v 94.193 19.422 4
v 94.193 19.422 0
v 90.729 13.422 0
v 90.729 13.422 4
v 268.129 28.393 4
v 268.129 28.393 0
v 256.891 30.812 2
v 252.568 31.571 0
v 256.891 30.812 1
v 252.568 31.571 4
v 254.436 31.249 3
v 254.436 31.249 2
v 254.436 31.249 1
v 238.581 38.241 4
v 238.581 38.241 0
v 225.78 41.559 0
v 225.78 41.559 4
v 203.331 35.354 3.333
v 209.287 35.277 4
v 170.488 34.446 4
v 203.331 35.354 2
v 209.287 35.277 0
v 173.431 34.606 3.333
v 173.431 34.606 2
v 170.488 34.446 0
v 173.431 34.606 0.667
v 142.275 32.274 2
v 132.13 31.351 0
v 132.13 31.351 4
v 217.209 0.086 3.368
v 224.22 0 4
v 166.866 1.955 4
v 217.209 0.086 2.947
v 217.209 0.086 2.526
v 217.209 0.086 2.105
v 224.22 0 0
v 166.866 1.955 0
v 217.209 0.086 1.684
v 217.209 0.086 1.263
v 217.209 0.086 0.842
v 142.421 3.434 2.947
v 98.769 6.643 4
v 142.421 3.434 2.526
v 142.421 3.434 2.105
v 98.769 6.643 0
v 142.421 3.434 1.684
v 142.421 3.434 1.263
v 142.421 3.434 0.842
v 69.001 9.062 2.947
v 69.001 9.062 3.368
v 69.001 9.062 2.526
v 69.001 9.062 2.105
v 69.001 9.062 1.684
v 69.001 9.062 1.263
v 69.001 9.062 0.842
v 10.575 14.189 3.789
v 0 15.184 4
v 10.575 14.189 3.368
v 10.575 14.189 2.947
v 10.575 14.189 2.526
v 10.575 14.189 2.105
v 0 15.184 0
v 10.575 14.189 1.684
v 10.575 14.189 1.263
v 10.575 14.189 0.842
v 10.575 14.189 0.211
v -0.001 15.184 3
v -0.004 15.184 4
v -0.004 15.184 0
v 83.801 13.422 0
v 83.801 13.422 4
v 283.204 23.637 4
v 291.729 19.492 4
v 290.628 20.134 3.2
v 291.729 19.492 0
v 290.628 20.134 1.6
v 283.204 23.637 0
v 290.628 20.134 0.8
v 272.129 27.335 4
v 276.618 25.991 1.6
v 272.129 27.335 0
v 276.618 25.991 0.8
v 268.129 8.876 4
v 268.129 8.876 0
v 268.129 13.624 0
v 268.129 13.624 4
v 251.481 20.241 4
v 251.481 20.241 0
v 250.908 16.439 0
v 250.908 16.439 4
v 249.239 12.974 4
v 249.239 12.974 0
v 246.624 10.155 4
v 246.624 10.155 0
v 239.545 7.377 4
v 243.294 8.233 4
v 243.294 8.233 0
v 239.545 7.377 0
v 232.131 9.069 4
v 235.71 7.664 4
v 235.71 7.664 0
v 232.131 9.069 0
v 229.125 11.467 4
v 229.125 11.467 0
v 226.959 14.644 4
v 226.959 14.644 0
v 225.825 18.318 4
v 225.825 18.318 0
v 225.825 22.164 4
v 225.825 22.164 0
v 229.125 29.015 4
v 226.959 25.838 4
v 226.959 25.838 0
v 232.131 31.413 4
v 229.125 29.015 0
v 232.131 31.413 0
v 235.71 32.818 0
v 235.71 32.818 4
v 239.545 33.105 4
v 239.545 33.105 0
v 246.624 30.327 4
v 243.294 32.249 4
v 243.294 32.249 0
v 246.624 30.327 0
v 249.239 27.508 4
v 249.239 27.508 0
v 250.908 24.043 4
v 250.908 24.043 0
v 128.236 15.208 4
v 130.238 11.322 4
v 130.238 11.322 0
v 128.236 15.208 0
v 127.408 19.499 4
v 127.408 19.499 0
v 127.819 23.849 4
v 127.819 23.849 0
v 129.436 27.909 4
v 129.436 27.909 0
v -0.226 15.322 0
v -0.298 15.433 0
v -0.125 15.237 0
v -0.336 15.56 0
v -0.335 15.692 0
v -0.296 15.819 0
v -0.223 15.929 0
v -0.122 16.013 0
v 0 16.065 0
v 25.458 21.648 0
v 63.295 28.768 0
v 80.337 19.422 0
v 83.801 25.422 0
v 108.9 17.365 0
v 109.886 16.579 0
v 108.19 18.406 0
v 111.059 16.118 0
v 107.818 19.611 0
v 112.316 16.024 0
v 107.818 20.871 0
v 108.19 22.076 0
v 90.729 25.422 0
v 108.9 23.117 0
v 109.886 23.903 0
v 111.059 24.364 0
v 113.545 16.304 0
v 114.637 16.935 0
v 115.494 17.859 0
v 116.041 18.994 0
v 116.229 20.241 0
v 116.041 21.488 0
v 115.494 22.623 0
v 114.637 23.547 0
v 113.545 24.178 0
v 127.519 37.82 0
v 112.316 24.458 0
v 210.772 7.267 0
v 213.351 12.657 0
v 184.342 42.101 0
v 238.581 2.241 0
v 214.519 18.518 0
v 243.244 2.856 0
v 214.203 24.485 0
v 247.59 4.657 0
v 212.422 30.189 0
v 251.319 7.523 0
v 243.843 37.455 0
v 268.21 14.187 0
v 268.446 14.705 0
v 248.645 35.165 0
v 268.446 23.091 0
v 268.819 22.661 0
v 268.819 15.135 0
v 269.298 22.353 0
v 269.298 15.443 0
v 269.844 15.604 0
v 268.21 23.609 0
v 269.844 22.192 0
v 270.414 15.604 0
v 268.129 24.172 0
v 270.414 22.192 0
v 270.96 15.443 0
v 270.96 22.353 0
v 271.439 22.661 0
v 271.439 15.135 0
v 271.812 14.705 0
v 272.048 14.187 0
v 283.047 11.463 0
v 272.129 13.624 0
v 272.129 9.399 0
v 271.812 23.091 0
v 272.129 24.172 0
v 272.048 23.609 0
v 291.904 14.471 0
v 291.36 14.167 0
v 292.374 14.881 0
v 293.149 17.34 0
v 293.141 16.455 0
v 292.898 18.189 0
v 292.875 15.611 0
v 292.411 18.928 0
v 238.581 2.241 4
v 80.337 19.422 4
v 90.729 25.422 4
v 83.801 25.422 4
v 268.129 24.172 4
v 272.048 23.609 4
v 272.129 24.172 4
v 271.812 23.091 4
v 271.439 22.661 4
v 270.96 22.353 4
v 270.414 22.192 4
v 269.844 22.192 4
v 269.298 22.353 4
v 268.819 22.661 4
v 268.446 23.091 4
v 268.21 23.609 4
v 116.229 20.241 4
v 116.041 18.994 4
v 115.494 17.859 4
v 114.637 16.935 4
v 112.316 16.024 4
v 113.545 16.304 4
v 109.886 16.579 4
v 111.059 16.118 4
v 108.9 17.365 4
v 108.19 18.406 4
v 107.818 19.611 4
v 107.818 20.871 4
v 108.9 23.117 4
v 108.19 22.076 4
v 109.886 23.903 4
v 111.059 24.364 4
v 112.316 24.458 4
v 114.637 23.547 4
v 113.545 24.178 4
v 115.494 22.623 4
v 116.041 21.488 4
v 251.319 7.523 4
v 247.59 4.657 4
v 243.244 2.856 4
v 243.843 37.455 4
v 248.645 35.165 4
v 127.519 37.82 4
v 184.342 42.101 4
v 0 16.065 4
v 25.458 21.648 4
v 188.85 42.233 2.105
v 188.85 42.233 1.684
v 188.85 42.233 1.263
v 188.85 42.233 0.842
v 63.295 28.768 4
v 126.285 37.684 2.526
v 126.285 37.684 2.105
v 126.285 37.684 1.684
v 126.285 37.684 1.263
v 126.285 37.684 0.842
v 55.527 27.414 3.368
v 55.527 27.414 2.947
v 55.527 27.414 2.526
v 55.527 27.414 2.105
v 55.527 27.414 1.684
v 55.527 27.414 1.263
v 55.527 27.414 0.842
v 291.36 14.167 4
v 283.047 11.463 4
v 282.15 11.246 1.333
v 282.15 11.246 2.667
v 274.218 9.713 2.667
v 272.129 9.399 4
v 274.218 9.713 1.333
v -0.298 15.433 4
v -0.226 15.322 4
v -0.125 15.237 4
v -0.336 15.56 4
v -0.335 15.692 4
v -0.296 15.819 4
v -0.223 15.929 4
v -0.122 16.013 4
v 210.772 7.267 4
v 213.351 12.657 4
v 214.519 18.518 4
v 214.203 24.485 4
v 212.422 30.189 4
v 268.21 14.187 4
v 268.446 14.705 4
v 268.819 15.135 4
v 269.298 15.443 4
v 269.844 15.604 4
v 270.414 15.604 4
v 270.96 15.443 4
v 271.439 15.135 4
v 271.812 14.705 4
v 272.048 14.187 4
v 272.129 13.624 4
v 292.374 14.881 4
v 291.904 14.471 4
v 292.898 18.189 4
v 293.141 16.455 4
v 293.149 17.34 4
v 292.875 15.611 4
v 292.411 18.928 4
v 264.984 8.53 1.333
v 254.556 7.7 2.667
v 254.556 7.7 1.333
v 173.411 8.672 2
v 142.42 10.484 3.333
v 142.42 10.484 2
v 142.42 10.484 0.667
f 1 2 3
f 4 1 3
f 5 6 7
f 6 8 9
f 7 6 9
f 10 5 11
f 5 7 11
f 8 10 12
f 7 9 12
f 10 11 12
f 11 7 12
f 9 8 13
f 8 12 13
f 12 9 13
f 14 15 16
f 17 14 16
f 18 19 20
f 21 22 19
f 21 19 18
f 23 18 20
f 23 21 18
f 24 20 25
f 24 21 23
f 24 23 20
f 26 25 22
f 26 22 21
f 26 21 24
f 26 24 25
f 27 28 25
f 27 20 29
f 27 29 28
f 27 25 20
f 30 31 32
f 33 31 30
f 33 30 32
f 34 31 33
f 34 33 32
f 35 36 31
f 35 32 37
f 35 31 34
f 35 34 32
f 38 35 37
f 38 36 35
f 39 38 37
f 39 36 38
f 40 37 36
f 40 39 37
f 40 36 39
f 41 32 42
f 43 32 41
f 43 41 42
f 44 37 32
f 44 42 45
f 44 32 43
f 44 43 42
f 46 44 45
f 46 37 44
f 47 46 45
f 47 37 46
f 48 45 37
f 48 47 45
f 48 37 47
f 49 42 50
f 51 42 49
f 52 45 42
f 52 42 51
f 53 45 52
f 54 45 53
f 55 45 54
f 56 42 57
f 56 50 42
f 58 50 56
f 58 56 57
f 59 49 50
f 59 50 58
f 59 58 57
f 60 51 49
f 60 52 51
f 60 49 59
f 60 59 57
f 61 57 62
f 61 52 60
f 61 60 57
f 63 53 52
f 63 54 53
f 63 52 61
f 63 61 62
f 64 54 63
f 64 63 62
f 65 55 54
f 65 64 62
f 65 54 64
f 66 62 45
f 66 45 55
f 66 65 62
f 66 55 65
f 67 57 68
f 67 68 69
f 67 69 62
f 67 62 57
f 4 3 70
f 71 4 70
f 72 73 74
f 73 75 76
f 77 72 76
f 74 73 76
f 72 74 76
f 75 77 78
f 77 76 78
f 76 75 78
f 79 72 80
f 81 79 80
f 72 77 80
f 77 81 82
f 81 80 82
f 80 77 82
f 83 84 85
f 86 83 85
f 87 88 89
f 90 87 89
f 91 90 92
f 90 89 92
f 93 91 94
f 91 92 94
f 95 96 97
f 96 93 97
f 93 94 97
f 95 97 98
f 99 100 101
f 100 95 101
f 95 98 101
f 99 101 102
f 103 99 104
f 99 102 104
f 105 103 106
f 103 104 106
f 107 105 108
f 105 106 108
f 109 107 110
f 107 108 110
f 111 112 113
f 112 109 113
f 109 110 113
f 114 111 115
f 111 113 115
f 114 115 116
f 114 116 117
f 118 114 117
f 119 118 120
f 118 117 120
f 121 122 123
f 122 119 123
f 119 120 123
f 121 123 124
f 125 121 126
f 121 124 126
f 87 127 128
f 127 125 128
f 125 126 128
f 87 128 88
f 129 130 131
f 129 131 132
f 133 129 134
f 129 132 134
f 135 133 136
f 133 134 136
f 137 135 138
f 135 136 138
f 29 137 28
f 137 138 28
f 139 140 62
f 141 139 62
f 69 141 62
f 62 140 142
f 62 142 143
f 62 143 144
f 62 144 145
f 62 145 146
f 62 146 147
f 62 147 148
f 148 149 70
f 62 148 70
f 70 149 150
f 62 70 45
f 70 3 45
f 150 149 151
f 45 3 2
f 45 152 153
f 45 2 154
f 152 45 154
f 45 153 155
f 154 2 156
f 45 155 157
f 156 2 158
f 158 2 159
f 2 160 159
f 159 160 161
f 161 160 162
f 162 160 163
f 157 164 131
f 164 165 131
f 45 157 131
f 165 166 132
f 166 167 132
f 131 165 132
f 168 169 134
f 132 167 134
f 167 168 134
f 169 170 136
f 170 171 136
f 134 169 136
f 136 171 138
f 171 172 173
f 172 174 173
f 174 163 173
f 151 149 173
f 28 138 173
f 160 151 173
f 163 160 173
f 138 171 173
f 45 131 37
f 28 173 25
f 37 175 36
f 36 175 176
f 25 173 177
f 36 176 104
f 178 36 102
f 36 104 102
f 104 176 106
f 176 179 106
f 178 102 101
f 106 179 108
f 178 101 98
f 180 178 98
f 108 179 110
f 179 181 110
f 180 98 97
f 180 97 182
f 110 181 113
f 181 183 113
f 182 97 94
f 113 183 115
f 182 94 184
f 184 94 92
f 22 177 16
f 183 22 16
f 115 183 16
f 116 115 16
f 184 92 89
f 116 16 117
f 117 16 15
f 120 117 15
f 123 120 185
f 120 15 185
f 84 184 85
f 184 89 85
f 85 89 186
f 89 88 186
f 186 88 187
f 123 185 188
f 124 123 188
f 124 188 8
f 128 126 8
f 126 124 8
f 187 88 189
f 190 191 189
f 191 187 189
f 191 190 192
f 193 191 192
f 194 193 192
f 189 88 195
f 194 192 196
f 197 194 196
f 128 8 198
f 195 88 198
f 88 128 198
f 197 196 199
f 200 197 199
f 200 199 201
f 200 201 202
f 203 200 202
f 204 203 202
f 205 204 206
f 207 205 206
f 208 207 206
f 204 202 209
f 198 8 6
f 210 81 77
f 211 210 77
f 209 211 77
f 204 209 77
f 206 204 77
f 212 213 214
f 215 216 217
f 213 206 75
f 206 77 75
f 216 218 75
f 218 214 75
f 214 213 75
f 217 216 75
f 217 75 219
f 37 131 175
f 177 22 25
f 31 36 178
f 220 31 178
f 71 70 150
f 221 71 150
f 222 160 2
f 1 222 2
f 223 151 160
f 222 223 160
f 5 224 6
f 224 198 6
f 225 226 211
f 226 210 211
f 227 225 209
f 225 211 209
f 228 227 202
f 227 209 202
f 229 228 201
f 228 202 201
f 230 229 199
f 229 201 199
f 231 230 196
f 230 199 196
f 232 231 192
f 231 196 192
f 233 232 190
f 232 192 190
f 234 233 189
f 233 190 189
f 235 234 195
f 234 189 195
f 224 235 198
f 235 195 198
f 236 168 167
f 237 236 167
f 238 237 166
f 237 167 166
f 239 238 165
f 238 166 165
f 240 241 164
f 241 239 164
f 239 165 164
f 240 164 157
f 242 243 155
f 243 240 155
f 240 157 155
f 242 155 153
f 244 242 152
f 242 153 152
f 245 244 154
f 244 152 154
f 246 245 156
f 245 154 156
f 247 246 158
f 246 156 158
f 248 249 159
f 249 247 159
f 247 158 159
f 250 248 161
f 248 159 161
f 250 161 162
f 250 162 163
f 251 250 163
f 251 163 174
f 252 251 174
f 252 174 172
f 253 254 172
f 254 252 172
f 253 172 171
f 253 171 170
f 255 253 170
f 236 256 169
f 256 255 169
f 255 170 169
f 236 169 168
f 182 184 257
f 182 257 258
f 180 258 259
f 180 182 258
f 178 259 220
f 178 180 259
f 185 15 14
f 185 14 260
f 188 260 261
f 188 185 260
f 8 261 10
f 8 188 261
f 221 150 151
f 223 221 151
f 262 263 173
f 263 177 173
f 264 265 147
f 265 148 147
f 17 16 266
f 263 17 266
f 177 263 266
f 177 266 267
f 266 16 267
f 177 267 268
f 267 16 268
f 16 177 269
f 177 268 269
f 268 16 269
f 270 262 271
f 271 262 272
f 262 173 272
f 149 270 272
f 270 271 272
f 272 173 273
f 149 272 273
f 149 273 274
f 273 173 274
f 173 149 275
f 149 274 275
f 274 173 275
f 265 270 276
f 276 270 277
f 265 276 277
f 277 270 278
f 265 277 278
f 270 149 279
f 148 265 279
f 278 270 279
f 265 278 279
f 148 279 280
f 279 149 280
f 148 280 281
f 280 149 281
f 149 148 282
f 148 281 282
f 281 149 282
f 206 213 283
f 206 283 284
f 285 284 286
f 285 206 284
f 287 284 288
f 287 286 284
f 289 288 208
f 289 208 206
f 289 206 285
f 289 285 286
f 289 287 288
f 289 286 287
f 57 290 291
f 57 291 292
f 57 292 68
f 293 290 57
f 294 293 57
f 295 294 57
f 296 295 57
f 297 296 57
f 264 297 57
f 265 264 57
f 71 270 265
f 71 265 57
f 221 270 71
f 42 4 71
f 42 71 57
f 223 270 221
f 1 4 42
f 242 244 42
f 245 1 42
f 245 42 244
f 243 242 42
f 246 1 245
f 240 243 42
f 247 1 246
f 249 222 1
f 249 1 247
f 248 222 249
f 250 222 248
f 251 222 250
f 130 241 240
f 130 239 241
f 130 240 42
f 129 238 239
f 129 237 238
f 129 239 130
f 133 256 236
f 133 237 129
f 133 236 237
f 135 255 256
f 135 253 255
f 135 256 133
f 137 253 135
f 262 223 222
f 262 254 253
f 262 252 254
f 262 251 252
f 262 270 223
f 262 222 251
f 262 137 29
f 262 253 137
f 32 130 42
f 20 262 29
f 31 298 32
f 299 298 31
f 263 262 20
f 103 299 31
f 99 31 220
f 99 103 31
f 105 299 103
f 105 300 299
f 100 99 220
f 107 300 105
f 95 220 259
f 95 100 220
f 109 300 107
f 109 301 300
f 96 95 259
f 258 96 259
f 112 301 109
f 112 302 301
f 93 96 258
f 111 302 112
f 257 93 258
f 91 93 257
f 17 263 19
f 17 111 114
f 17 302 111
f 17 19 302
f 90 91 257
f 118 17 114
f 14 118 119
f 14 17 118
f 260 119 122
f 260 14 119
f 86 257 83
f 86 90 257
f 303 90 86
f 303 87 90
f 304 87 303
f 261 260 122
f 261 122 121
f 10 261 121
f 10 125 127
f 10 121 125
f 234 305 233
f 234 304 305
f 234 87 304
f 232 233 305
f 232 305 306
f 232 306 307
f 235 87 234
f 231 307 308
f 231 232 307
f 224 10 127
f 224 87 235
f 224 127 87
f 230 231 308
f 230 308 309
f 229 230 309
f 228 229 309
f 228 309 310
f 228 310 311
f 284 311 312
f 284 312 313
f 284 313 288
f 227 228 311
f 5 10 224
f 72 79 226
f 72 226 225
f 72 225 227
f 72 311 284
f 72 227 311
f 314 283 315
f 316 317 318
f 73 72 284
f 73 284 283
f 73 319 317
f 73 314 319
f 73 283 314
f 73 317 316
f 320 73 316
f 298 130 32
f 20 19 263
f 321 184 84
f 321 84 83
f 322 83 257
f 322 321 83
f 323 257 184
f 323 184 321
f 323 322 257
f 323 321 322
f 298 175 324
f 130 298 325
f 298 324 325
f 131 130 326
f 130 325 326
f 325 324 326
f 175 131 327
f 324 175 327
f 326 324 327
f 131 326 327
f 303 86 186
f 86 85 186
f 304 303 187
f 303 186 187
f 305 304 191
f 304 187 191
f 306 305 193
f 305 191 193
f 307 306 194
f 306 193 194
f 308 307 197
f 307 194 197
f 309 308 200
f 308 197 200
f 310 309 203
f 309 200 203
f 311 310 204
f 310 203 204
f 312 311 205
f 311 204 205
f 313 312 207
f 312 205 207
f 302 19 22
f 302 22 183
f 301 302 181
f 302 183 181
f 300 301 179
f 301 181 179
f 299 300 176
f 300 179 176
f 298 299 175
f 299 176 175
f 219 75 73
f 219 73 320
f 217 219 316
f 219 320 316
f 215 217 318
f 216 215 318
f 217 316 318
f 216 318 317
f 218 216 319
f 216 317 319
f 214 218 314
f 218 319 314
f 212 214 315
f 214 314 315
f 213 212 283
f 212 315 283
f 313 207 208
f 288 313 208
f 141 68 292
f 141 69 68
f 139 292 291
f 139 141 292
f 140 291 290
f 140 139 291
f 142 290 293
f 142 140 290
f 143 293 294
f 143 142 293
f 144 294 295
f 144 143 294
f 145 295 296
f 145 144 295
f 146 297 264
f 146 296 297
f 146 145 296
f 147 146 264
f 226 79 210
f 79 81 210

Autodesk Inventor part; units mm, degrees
ref_plane "YZ Plane" through (0, 0, 0) normal (1, 0, 0) x (0, 1, 0)
ref_plane "XZ Plane" through (0, 0, 0) normal (0, 1, 0) x (-1, 0, 0)
ref_plane "XY Plane" through (0, 0, 0) normal (0, 0, 1) x (1, 0, 0)
sketch "Sketch1" plane through (0, 0, 0) normal (0, 0, 1) x (1, 0, 0)
  spline S0 degree 4 poles (254.436054, 38.258138) (252.159915, 38.650332) (246.788709, 39.499265) (237.984874, 40.618279) (225.357478, 41.704285) (211.202741, 42.341661) (196.392584, 42.47009) (181.031283, 42.070233) (165.506388, 41.221743) (149.785249, 40.04478) (134.1096, 38.577548) (118.624688, 36.850842) (103.500036, 34.939301) (88.901638, 32.883406) (74.995754, 30.738214) (61.917783, 28.562704) (49.827113, 26.40977) (38.835364, 24.340018) (29.07721, 22.403865) (20.632296, 20.65644) (13.645605, 19.149082) (6.913163, 17.660714) (2.90218, 16.740022) (0.469137, 16.188187) (0, 16.065) knots 0.21429705 0.21429705 0.21429705 0.21429705 0.21429705 0.2433201 0.28177524 0.32154178 0.36237973 0.40400459 0.44617789 0.48866482 0.5312306 0.57368816 0.61580317 0.65733642 0.6980466 0.73768213 0.77598623 0.81268845 0.84749504 0.88008735 0.91009265 0.93705903 0.9603631 1 1 1 1 1
  spline S1 degree 4 poles (299.999997, 15.624) (299.805651, 13.312974) (297.70854, 10.343184) (293.050897, 7.5008) (285.395888, 4.883043) (278.112378, 3.216454) (269.51472, 1.892454) (259.681019, 0.912997) (248.712883, 0.278332) (236.711867, -0.030891) (223.806667, -0.050368) (210.125319, 0.193333) (195.775416, 0.645033) (180.96771, 1.249367) (165.65166, 1.982539) (150.191633, 2.90484) (134.687258, 3.945111) (119.337536, 5.049498) (104.304232, 6.19869) (89.75661, 7.356132) (75.849241, 8.488651) (62.742943, 9.582403) (50.581067, 10.622604) (39.497088, 11.57965) (29.629376, 12.451281) (21.071247, 13.226368) (13.963939, 13.872105) (7.103576, 14.512622) (2.968279, 14.899676) (0.533018, 15.1397) (-0.004161, 15.184114) knots 0 0 0 0 0 0.05437224 0.07982113 0.10791215 0.1384988 0.1713415 0.20618709 0.24278377 0.28089063 0.3202767 0.36071301 0.4020228 0.44398485 0.4863729 0.52895769 0.5714601 0.61364209 0.65526508 0.6960853 0.73585299 0.77430798 0.81117416 0.84615676 0.87892978 0.90911464 0.93625212 0.9597112 1 1 1 1 1
  arc A0 (0, 16.065) -> (-0.004161, 15.184114) centre (0.115799, 15.624) ccw
  line L0 (0.115799, 15.624) -> (227.990221, 15.624) construction
  line L1 (299.999997, 15.624) -> (0.115799, 15.624) construction
  line L2 (299.999997, 15.624) -> (199.999997, 15.624) construction
  line L3 (199.999997, 15.624) -> (199.999997, 42.37734) construction
  line L4 (199.999997, 15.624) -> (199.999997, 0.52729)
  line L5 (0, 0) -> (0, 20.241)
  line L6 (0, 20.241) -> (238.581, 20.241) construction
  circle A1 centre (238.581, 20.241) radius 14
  line L7 (238.581, 20.241) -> (208.581, 20.241)
  line L8 (238.581, 25.359) -> (238.581, 20.241)
  line L9 (0, 20.241) -> (112, 20.241) construction
  circle A2 centre (112, 20.241) radius 5.39
  line L10 (0, 15.624) -> (112, 15.624) construction
  line L11 (0, 15.624) -> (112, 15.624) construction
  line L12 (112, 15.624) -> (112, 35.994456)
  line L13 (112, 15.624) -> (112, 5.61525)
  spline S2 degree 4 poles (299.285198, 20.241) (299.227939, 20.131643) (299.16804, 20.023225) (299.105573, 19.915754) (299.040612, 19.809235) knots 0 0 0 0 0 1 1 1 1 1
  line L14 (299.207055, 20.082158) -> (298.87417, 19.536312) construction
  arc A3 (298.903999, 19.593162) -> (299.170168, 20.029611) centre (292.291091, 23.925437) ccw construction
  line L15 (299.43203, 20.521431) -> (299.138367, 19.960569) construction
  arc A4 (299.163926, 20.01882) -> (299.398715, 20.467241) centre (292.801001, 23.636075) ccw construction
  spline S3 degree 2 poles (295.850621, 16.559978) (295.157262, 16.069203) (294.393311, 15.624) knots 0 0 0 1 1 1
  line L16 (294.550692, 15.715716) -> (294.235931, 15.532284) construction
  arc A5 (294.267154, 15.551069) -> (294.518956, 15.69781) centre (283.884356, 33.65696) ccw construction
  spline S4 degree 4 poles (296.856901, 15.624) (296.618326, 15.862944) (296.370731, 16.098547) (296.114674, 16.330852) (295.850621, 16.559978) knots 0 0 0 0 0 1 1 1 1 1
  spline S5 degree 4 poles (219.58717, 34.91187) (218.695351, 34.95198) (214.858509, 35.106335) (210.707211, 35.329502) (192.898023, 35.446366) (181.42777, 35.055508) (165.177387, 34.181901) (149.561876, 33.12667) (133.828431, 31.347909) (128.265438, 31.097419) (123.390775, 30.590026) knots 0 0 0 0 0 0.13924435 0.23321956 0.36393672 0.50998276 0.65711487 0.7981047 1 1 1 1 1
  line L17 (295.959293, 16.465681) -> (295.74195, 16.654276) construction
  arc A6 (295.937354, 16.484307) -> (295.763482, 16.635181) centre (281.87292, 0.451609) ccw construction
  line L18 (232.743774, 34.364452) -> (201.193566, 35.681454) construction
  arc A7 (229.586762, 34.454933) -> (204.347135, 35.508511) centre (136.348344, -1896.324468) ccw construction
  arc A8 (264.266057, 15.123) -> (264.360826, 15.624) centre (238.581, 20.241) ccw
  circle A9 centre (238.581, 20.241) radius 24
  circle A10 centre (112, 20.241) radius 15.39
  spline S6 degree 4 poles (299.999997, 15.624) (300.269142, 17.933652) (298.783415, 21.267693) (294.693448, 24.979847) (287.53174, 28.940551) (280.486947, 31.820538) (271.480983, 34.718213) (262.486804, 36.793013) (257.700386, 37.695672) (254.436054, 38.258138) knots 0 0 0 0 0 0.24755477 0.36385739 0.4925498 0.63299607 0.77826439 1 1 1 1 1
  line L19 (285.294543, 32.941011) -> (223.577565, 43.575266) construction
  arc A11 (278.722442, 32.634865) -> (229.668212, 41.087243) centre (217.218351, -177.738587) ccw construction
  line L20 (285.294543, 32.941011) -> (223.577565, 43.575266) construction
  arc A12 (278.877125, 33.041766) -> (229.658629, 41.522447) centre (200.894913, -272.473315) ccw construction
  spline S7 degree 4 poles (251.493, 31.73616) (243.700929, 32.967588) (232.160237, 34.296592) (216.442824, 35.287928) (196.392341, 35.461091) (181.031705, 35.061513) (165.505292, 34.212684) (149.788285, 33.036509) (134.101234, 31.567156) (118.647366, 29.846206) (103.439709, 27.919279) (89.058912, 25.903716) (74.837064, 23.692714) (62.488433, 21.669546) (49.639937, 19.354465) (46.379459, 18.742869) (43.812536, 18.259032) knots 0 0 0 0 0 0.1639631 0.23233838 0.3020312 0.37264227 0.44377843 0.51504665 0.58613365 0.65664712 0.72618654 0.7943479 0.86070997 0.92034602 1 1 1 1 1 construction
  spline S8 degree 4 poles (295.845009, 16.556007) (295.719822, 16.664559) (294.584958, 17.628339) (292.058546, 19.428263) (287.516704, 21.93465) (280.467029, 24.832118) (271.97142, 27.522599) (264.208658, 29.400369) (258.409244, 30.551465) (255.053616, 31.142888) (254.436054, 31.249298) (253.968946, 31.329784) (253.501839, 31.41027) (253.034731, 31.490756) (252.567623, 31.571241) knots 0 0 0 0 0 0.01890503 0.16895946 0.33499927 0.51620401 0.71116085 0.9183366 0.96483207 0.96483207 0.96483207 0.96483207 1 1 1 1 1
  line L21 (285.294543, 25.932171) -> (223.577565, 36.566425) construction
  line L22 (285.294543, 25.932171) -> (223.577565, 36.566425) construction
  arc A13 (278.722442, 25.626025) -> (229.668212, 34.078402) centre (217.218351, -184.747428) ccw construction
  line L23 (270.129, 9.125374) -> (275.129, 9.125374) construction
  line L24 (281.07, 24.45816) -> (286.07, 24.45816) construction
  line L25 (318.821413, -3.367269) -> (272.868604, 36.479282) construction
  arc A14 (303.207925, 0.551953) -> (278.959518, 21.578206) centre (281.857648, 0.425162) ccw construction
  spline S9 degree 4 poles (295.835285, 16.564433) (293.417091, 14.88464) (288.41352, 12.692641) (280.70627, 10.669821) (269.511023, 8.939829) (259.682627, 7.96324) (248.712204, 7.32734) (236.712148, 7.018633) (223.806545, 6.998947) (210.125394, 7.242728) (195.775305, 7.694406) (180.967993, 8.298721) (165.65086, 9.03198) (150.193891, 9.954022) (134.681006, 10.995018) (119.354518, 12.097424) (104.258979, 13.251926) (89.874814, 14.39542) (75.752353, 15.547068) (62.906491, 16.616479) (50.510696, 17.677636) (46.516568, 18.024605) (43.812536, 18.259032) knots 0 0 0 0 0 0.08476672 0.12402522 0.16617938 0.21090431 0.25787677 0.30678758 0.35734028 0.40924097 0.46226281 0.51612182 0.5705276 0.62518592 0.67973848 0.7338798 0.78730362 0.83969707 0.89073959 0.93714265 1 1 1 1 1
  spline S10 degree 4 poles (21.462276, 20.241) (20.622656, 20.316984) (20.124028, 20.362207) (19.919133, 20.380856) (19.554048, 20.414029) knots 0 0 0 0 0 1 1 1 1 1 construction
  line L26 (68.488377, 16.119755) -> (19.136695, 20.398308) construction
  arc A15 (63.551474, 16.528056) -> (24.070206, 19.950891) centre (-819.899413, -9944.371227) ccw construction
  line L27 (21.724437, 20.217275) -> (21.200116, 20.264725) construction
  arc A16 (21.252548, 20.259982) -> (21.672005, 20.222022) centre (898.635849, 9712.955601) ccw construction
  line L28 (74.254065, 23.996937) -> (13.371006, 12.521126) construction
  arc A17 (68.175943, 22.793945) -> (19.469999, 13.613391) centre (1053.390082, -5337.891027) ccw construction
  spline S11 degree 4 poles (218.437499, 7.193419) (217.617295, 7.240848) (213.819214, 7.468804) (209.586315, 6.850678) (192.548492, 7.944114) (181.146901, 8.16297) (165.746092, 9.02826) (149.142366, 9.880106) (139.977668, 10.751942) (129.107316, 11.246393) (124.68665, 11.528881) knots 0 0 0 0 0 0.12763083 0.21372336 0.33362841 0.4674456 0.60262129 0.73842442 0.88039529 0.88039529 0.88039529 0.88039529 0.88039529
  line L29 (133.533683, 10.96354) -> (115.839617, 12.094223) construction
  arc A18 (117.617989, 12.078874) -> (131.767822, 11.174674) centre (141.026952, 267.238396) ccw construction
  line L30 (140.664975, 32.388062) -> (106.116576, 28.79199) construction
  arc A19 (137.221962, 31.449676) -> (109.679039, 28.58279) centre (140.622493, -134.959578) ccw construction
  circle A20 centre (238.581, 20.241) radius 18
  line L31 (238.581, 38.241) -> (225.78, 41.559)
  line L32 (238.581, 2.241) -> (224.22, 0)
  line L33 (214.581, 20.241) -> (214.581, 42.126574) construction
  line L34 (127.39, 20.241) -> (127.39, 11.525517) construction
  line L35 (127.39, 20.241) -> (131.31394, 20.241) construction
  line L36 (96.61, 20.241) -> (96.61, 13.863077) construction
  line L37 (270.129, 5.61525) -> (270.129, 15.624) construction
  line L38 (272.129, 7.61525) -> (272.129, 13.624)
  line L39 (268.129, 13.624) -> (268.129, 7.61525)
  arc A21 (268.129, 7.61525) -> (272.129, 7.61525) centre (270.129, 7.61525) ccw
  arc A22 (272.129, 13.624) -> (268.129, 13.624) centre (270.129, 13.624) ccw
  line L40 (270.129, 32.18075) -> (270.129, 22.172) construction
  line L41 (272.129, 30.18075) -> (272.129, 24.172)
  line L42 (268.129, 24.172) -> (268.129, 30.18075)
  arc A23 (272.129, 30.18075) -> (268.129, 30.18075) centre (270.129, 30.18075) ccw
  arc A24 (268.129, 24.172) -> (272.129, 24.172) centre (270.129, 24.172) ccw
  arc A25 (199.999997, 42.315467) -> (199.853847, 42.377258) centre (190.581, 20.241) ccw
  arc A26 (171.272979, 34.495835) -> (171.268099, 34.489223) centre (190.581, 20.241) ccw
  arc A27 (210.748391, 7.230376) -> (209.287499, 35.276521) centre (190.581, 20.241) ccw
  arc A28 (169.445537, 8.870309) -> (169.474432, 8.816764) centre (190.581, 20.241) ccw
  arc A29 (153.976817, 9.682431) -> (154.030255, 9.739387) centre (142.78, 20.241) ccw
  arc A30 (151.241916, 33.095886) -> (151.219343, 33.110716) centre (142.78, 20.241) ccw
  arc A31 (132.12991, 31.350801) -> (130.322928, 11.203663) centre (142.78, 20.241) ccw
  arc A32 (95.274104, 13.969298) -> (95.169771, 26.74146) centre (81.22, 20.241) ccw
  arc A33 (66.333989, 16.334751) -> (66.538876, 15.624) centre (81.22, 20.241) ccw
  line L43 (112, 20.241) -> (112, 14.851) construction
  line L44 (112, 14.851) -> (87.265, 19.422) construction
  circle A34 centre (87.265, 19.422) radius 4
  circle A35 centre (238.581, 20.241) radius 12.9
  circle A36 centre (112, 20.241) radius 4.229
  circle A37 centre (87.265, 19.422) radius 6
  line L45 (83.800898, 13.422) -> (80.336797, 19.422)
  line L46 (80.336797, 19.422) -> (83.800898, 25.422)
  line L47 (83.800898, 25.422) -> (90.729102, 25.422)
  line L48 (90.729102, 25.422) -> (94.193203, 19.422)
  line L49 (94.193203, 19.422) -> (90.729102, 13.422)
  line L50 (90.729102, 13.422) -> (83.800898, 13.422)
  point P0 (0.783, 16.254)
  point P1 (3.213, 16.812)
  point P2 (7.239, 17.724)
  point P3 (12.813, 18.96)
  point P4 (19.884, 20.484)
  point P5 (28.374, 22.245)
  point P6 (38.199, 24.195)
  point P7 (49.254, 26.28)
  point P8 (61.419, 28.446)
  point P9 (74.571, 30.636)
  point P10 (88.56, 32.793)
  point P11 (103.242, 34.86)
  point P12 (118.455, 36.783)
  point P13 (134.028, 38.511)
  point P14 (149.793, 39.984)
  point P15 (165.576, 41.16)
  point P16 (181.206, 41.985)
  point P17 (196.638, 42.363)
  point P18 (211.554, 42.222)
  point P19 (239.145, 40.389)
  point P20 (262.68, 36.666)
  point P21 (272.577, 34.218)
  point P22 (281.07, 31.467)
  point P23 (288.069, 28.491)
  point P24 (293.505, 25.359)
  point P25 (297.324, 22.137)
  point P26 (300, 15.624)
  point P27 (0.861, 15.105)
  point P28 (3.342, 14.868)
  point P29 (7.446, 14.481)
  point P30 (13.122, 13.953)
  point P31 (20.31, 13.296)
  point P32 (28.92, 12.519)
  point P33 (38.856, 11.64)
  point P34 (50.007, 10.674)
  point P35 (62.244, 9.63)
  point P36 (75.429, 8.529)
  point P37 (89.418, 7.389)
  point P38 (104.052, 6.228)
  point P39 (119.172, 5.076)
  point P40 (134.613, 3.966)
  point P41 (150.207, 2.928)
  point P42 (165.783, 2.013)
  point P43 (181.167, 1.263)
  point P44 (196.068, 0.663)
  point P45 (210.468, 0.225)
  point P46 (237.189, 0.039)
  point P47 (249.246, 0.378)
  point P48 (260.262, 1.05)
  point P49 (270.129, 2.076)
  point P50 (278.739, 3.462)
  point P51 (285.993, 5.211)
  point P52 (291.81, 7.314)
  point P53 (296.121, 9.756)
  point P54 (298.863, 12.531)
  point P55 (199.999997, 15.624)
  point P56 (225.364219, 15.624)
  point P57 (238.581, 6.241)
  point P58 (238.581, 34.241)
  point P59 (225.364219, 15.624)
  point P60 (251.797781, 15.624)
  point P61 (0, 16.065)
  point P62 (0, 15.183769)
  point P63 (224.581, 20.241)
  point P64 (112, 25.631)
  point P65 (0, 9.065)
  point P66 (0.783, 9.254)
  point P67 (3.213, 9.812)
  point P68 (7.239, 10.724)
  point P69 (12.813, 11.96)
  point P70 (19.884, 13.484)
  point P71 (28.374, 15.245)
  point P72 (38.199, 17.195)
  point P73 (49.254, 19.28)
  point P74 (61.419, 21.446)
  point P75 (74.571, 23.636)
  point P76 (88.56, 25.793)
  point P77 (103.242, 27.86)
  point P78 (118.455, 29.783)
  point P79 (134.028, 31.511)
  point P80 (149.793, 32.984)
  point P81 (165.576, 34.16)
  point P82 (181.206, 34.985)
  point P83 (225.78, 34.559)
  point P84 (239.145, 33.389)
  point P85 (251.493, 31.745)
  point P86 (262.68, 29.666)
  point P87 (272.577, 27.218)
  point P88 (281.07, 24.467)
  point P89 (288.069, 21.491)
  point P90 (293.505, 18.359)
  point P91 (297.324, 15.137)
  point P92 (299.493, 11.879)
  point P93 (300, 8.624)
  point P94 (-0.004161, 22.184114)
  point P95 (0.861, 22.105)
  point P96 (3.342, 21.868)
  point P97 (7.446, 21.481)
  point P98 (13.122, 20.953)
  point P99 (20.31, 20.296)
  point P100 (28.92, 19.519)
  point P101 (38.856, 18.64)
  point P102 (50.007, 17.674)
  point P103 (62.244, 16.63)
  point P104 (75.429, 15.529)
  point P105 (89.418, 14.389)
  point P106 (104.052, 13.228)
  point P107 (119.172, 12.076)
  point P108 (134.613, 10.966)
  point P109 (150.207, 9.928)
  point P110 (165.783, 9.013)
  point P111 (181.167, 8.263)
  point P112 (196.068, 7.663)
  point P113 (210.468, 7.225)
  point P114 (224.22, 7)
  point P115 (237.189, 7.039)
  point P116 (249.246, 7.378)
  point P117 (260.262, 8.05)
  point P118 (270.129, 9.076)
  point P119 (278.739, 10.462)
  point P120 (285.993, 12.211)
  point P121 (291.81, 14.314)
  point P122 (296.121, 16.756)
  point P123 (298.863, 19.531)
  point P124 (300, 22.624)
  point P125 (18.740477, 20.241)
  point P126 (216.96867, 35.022953)
  point P127 (0, 16.065)
  point P128 (296.856901, 15.624)
  point P129 (294.393311, 15.624)
  point P130 (219.58717, 34.91187)
  point P131 (123.390775, 30.590026)
  point P132 (254.436054, 38.258138)
  point P133 (0, 9.05616)
  point P134 (0.783, 9.24516)
  point P135 (3.213, 9.80316)
  point P136 (7.239, 10.71516)
  point P137 (12.813, 11.95116)
  point P138 (19.884, 13.47516)
  point P139 (28.374, 15.23616)
  point P140 (38.199, 17.18616)
  point P141 (49.254, 19.27116)
  point P142 (61.419, 21.43716)
  point P143 (74.571, 23.62716)
  point P144 (88.56, 25.78416)
  point P145 (103.242, 27.85116)
  point P146 (118.455, 29.77416)
  point P147 (134.028, 31.50216)
  point P148 (149.793, 32.97516)
  point P149 (165.576, 34.15116)
  point P150 (181.206, 34.97616)
  point P151 (196.638, 35.35416)
  point P152 (211.554, 35.21316)
  point P153 (225.78, 34.55016)
  point P154 (262.68, 29.65716)
  point P155 (272.577, 27.20916)
  point P156 (297.324, 15.12816)
  point P157 (299.493, 11.87016)
  point P158 (300, 8.61516)
  point P159 (254.436054, 31.249298)
  point P160 (216.884838, -206.362485)
  point P161 (278.876889, 26.073396)
  point P162 (229.590604, 33.866167)
  point P163 (-0.004161, 22.233488)
  point P164 (0.861, 22.154374)
  point P165 (3.342, 21.917374)
  point P166 (7.446, 21.530374)
  point P167 (13.122, 21.002374)
  point P168 (28.92, 19.568374)
  point P169 (38.856, 18.689374)
  point P170 (50.007, 17.723374)
  point P171 (62.244, 16.679374)
  point P172 (75.429, 15.578374)
  point P173 (89.418, 14.438374)
  point P174 (104.052, 13.277374)
  point P175 (119.172, 12.125374)
  point P176 (134.613, 11.015374)
  point P177 (150.207, 9.977374)
  point P178 (165.783, 9.062374)
  point P179 (181.167, 8.312374)
  point P180 (196.068, 7.712374)
  point P181 (210.468, 7.274374)
  point P182 (224.22, 7.049374)
  point P183 (237.189, 7.088374)
  point P184 (249.246, 7.427374)
  point P185 (260.262, 8.099374)
  point P186 (278.739, 10.511374)
  point P187 (285.993, 12.260374)
  point P188 (296.121, 16.805374)
  point P189 (298.863, 19.580374)
  point P190 (300, 22.673374)
  point P191 (225.700031, -0.009448)
  point P192 (252.261653, 0.521981)
  point P193 (227.349521, 41.450759)
  point P194 (105.977751, 6.07821)
  point P195 (115.800844, 5.327728)
  point P196 (98.259993, 27.173842)
  point P197 (260.452219, 30.122789)
  point P198 (123.585295, 30.371797)
  point P199 (134.59788, 31.560388)
  dimension "d38" = 10.78
  dimension "d67" = 12
  dimension "d17" = 100
  dimension "d19" = 20.241
  dimension "d20" = 238.581
  dimension "d21" = 28
  dimension "d37" = 112
  dimension "d39" = 112
  dimension "d40" = 0
  dimension "d43" = 10
  dimension "d44" = 10
  dimension "d55" = 4
  dimension "d56" = 90
  dimension "d58" = 4
  dimension "d60" = 8
  dimension "d62" = 0.819
  dimension "d63" = 24.735
  dimension "d65" = 25.8
  dimension "d66" = 8.458
sketch "Sketch1 outline for Extrusion3" plane through (0, 0, 0) normal (0, 0, 1) x (1, 0, 0)
  spline S0 degree 4 poles (0, 15.183769) (-0.001046, 15.183856) (-0.002088, 15.183942) (-0.003126, 15.184028) (-0.004161, 15.184114) knots 0 0 0 0 0 1 1 1 1 1
  spline S1 degree 4 poles (224.22, 0) (222.479951, 0.013004) (217.292297, 0.069187) (208.469243, 0.245463) (195.775416, 0.645033) (180.96771, 1.249367) (165.65166, 1.982539) (150.191633, 2.90484) (134.687258, 3.945111) (119.337536, 5.049498) (104.304232, 6.19869) (89.75661, 7.356132) (75.849241, 8.488651) (62.742943, 9.582403) (50.581067, 10.622604) (39.497088, 11.57965) (29.629376, 12.451281) (21.071247, 13.226368) (13.963939, 13.872105) (7.107973, 14.512211) (2.97534, 14.899015) (0.541913, 15.138823) (0, 15.183769) knots 0 0 0 0 0 0.02936819 0.08711706 0.14611338 0.20604122 0.26657745 0.32739466 0.3880942 0.44833615 0.50777977 0.56607692 0.6228709 0.67779016 0.73044036 0.78040055 0.82720513 0.87031346 0.90906968 0.94257262 1 1 1 1 1
  line L0 (224.22, 0) -> (238.581, 2.241)
  arc A0 (238.581, 2.241) -> (251.319332, 7.523497) centre (238.581, 20.241) ccw
  spline S2 degree 4 poles (268.129, 8.876482) (267.350973, 8.784165) (264.070152, 8.41388) (259.922783, 8.03946) (255.648904, 7.749196) (252.134203, 7.563785) (251.319332, 7.523497) knots 0 0 0 0 0 0.19446677 0.81409157 1 1 1 1 1
  line L1 (268.129, 8.876482) -> (268.129, 13.624)
  arc A1 (268.129, 13.624) -> (272.129, 13.624) centre (270.129, 13.624) cw
  line L2 (272.129, 13.624) -> (272.129, 9.39886)
  spline S3 degree 4 poles (295.835285, 16.564433) (293.417091, 14.88464) (288.41352, 12.692641) (282.206639, 11.063603) (275.277329, 9.862415) (272.65595, 9.474358) (272.129, 9.39886) knots 0 0 0 0 0 0.63339451 0.92674211 1 1 1 1 1
  spline S4 degree 4 poles (295.835285, 16.564433) (295.712426, 16.670837) (294.579422, 17.632282) (292.055318, 19.430045) (287.516704, 21.93465) (281.462074, 24.423147) (276.515305, 26.06668) (273.276333, 27.014249) (272.129, 27.335374) knots 0 0 0 0 0 0.03023743 0.27499105 0.54581841 0.84138126 1 1 1 1 1
  line L3 (272.129, 27.335374) -> (272.129, 24.172)
  arc A2 (272.129, 24.172) -> (268.129, 24.172) centre (270.129, 24.172) cw
  line L4 (268.129, 24.172) -> (268.129, 28.393044)
  spline S5 degree 4 poles (268.129, 28.393044) (267.95313, 28.436967) (265.243797, 29.109201) (261.874729, 29.863619) (258.409244, 30.551465) (255.053616, 31.142888) (254.436054, 31.249298) (253.968946, 31.329784) (253.501839, 31.41027) (253.034731, 31.490756) (252.567623, 31.571241) knots 0 0 0 0 0 0.04751866 0.73070527 0.88402957 0.88402957 0.88402957 0.88402957 1 1 1 1 1
  arc A3 (252.567623, 31.571241) -> (238.581, 38.241) centre (238.581, 20.241) ccw
  line L5 (238.581, 38.241) -> (225.78, 41.559)
  spline S6 degree 4 poles (225.78, 41.559) (223.981701, 41.678798) (218.618296, 41.998081) (209.491978, 42.356496) (196.392584, 42.47009) (181.031283, 42.070233) (165.506388, 41.221743) (149.785249, 40.04478) (134.1096, 38.577548) (118.624688, 36.850842) (103.500036, 34.939301) (88.901638, 32.883406) (74.995754, 30.738214) (61.917783, 28.562704) (49.827113, 26.40977) (38.835364, 24.340018) (29.07721, 22.403865) (20.632296, 20.65644) (13.645605, 19.149082) (6.913163, 17.660714) (2.90218, 16.740022) (0.469137, 16.188187) (0, 16.065) knots 0 0 0 0 0 0.02971241 0.08811623 0.14764545 0.20795901 0.26872109 0.32959596 0.39031605 0.45054625 0.50994444 0.56816554 0.62484975 0.67962982 0.73211898 0.78189715 0.82850859 0.87142025 0.90998584 0.94331385 1 1 1 1 1
  arc A4 (0, 16.065) -> (-0.004161, 15.184114) centre (0.115799, 15.624) ccw
  arc A5 (130.237617, 11.322439) -> (132.12991, 31.350801) centre (142.78, 20.241) cw
  spline S7 degree 4 poles (209.287499, 35.276521) (208.016254, 35.302234) (203.394539, 35.374392) (192.107099, 35.419415) (181.42777, 35.055508) (165.177387, 34.181901) (152.027787, 33.293306) (140.12289, 32.036547) (134.373831, 31.53661) (132.12991, 31.350801) knots 0 0 0 0 0 0.08041067 0.26080902 0.46236226 0.66541434 0.85998968 1 1 1 1 1
  arc A6 (209.287499, 35.276521) -> (210.772015, 7.267069) centre (190.581, 20.241) cw
  spline S8 degree 4 poles (210.772015, 7.267069) (208.879361, 7.312262) (203.376792, 7.457482) (194.11369, 7.76222) (180.967993, 8.298721) (165.65086, 9.03198) (151.022109, 9.904617) (140.198122, 10.625231) (133.276252, 11.107079) (130.237617, 11.322439) knots 0 0 0 0 0 0.09754364 0.2824031 0.47018137 0.65986596 0.85043099 1 1 1 1 1
  line L6 (83.800898, 13.422) -> (80.336797, 19.422)
  line L7 (80.336797, 19.422) -> (83.800898, 25.422)
  line L8 (83.800898, 25.422) -> (90.729102, 25.422)
  line L9 (90.729102, 25.422) -> (94.193203, 19.422)
  line L10 (94.193203, 19.422) -> (90.729102, 13.422)
  line L11 (90.729102, 13.422) -> (83.800898, 13.422)
  circle A7 centre (112, 20.241) radius 4.229
  circle A8 centre (238.581, 20.241) radius 12.9
extrude "Extrusion3" add sketch "Sketch1 outline for Extrusion3" along normal blind 4
fillet "Fillet3" radius 3 1 edges at (295.8353, 16.5644, 2)
properties part number "Rib V6 Aileron BB" material "Wood (Maple)"
